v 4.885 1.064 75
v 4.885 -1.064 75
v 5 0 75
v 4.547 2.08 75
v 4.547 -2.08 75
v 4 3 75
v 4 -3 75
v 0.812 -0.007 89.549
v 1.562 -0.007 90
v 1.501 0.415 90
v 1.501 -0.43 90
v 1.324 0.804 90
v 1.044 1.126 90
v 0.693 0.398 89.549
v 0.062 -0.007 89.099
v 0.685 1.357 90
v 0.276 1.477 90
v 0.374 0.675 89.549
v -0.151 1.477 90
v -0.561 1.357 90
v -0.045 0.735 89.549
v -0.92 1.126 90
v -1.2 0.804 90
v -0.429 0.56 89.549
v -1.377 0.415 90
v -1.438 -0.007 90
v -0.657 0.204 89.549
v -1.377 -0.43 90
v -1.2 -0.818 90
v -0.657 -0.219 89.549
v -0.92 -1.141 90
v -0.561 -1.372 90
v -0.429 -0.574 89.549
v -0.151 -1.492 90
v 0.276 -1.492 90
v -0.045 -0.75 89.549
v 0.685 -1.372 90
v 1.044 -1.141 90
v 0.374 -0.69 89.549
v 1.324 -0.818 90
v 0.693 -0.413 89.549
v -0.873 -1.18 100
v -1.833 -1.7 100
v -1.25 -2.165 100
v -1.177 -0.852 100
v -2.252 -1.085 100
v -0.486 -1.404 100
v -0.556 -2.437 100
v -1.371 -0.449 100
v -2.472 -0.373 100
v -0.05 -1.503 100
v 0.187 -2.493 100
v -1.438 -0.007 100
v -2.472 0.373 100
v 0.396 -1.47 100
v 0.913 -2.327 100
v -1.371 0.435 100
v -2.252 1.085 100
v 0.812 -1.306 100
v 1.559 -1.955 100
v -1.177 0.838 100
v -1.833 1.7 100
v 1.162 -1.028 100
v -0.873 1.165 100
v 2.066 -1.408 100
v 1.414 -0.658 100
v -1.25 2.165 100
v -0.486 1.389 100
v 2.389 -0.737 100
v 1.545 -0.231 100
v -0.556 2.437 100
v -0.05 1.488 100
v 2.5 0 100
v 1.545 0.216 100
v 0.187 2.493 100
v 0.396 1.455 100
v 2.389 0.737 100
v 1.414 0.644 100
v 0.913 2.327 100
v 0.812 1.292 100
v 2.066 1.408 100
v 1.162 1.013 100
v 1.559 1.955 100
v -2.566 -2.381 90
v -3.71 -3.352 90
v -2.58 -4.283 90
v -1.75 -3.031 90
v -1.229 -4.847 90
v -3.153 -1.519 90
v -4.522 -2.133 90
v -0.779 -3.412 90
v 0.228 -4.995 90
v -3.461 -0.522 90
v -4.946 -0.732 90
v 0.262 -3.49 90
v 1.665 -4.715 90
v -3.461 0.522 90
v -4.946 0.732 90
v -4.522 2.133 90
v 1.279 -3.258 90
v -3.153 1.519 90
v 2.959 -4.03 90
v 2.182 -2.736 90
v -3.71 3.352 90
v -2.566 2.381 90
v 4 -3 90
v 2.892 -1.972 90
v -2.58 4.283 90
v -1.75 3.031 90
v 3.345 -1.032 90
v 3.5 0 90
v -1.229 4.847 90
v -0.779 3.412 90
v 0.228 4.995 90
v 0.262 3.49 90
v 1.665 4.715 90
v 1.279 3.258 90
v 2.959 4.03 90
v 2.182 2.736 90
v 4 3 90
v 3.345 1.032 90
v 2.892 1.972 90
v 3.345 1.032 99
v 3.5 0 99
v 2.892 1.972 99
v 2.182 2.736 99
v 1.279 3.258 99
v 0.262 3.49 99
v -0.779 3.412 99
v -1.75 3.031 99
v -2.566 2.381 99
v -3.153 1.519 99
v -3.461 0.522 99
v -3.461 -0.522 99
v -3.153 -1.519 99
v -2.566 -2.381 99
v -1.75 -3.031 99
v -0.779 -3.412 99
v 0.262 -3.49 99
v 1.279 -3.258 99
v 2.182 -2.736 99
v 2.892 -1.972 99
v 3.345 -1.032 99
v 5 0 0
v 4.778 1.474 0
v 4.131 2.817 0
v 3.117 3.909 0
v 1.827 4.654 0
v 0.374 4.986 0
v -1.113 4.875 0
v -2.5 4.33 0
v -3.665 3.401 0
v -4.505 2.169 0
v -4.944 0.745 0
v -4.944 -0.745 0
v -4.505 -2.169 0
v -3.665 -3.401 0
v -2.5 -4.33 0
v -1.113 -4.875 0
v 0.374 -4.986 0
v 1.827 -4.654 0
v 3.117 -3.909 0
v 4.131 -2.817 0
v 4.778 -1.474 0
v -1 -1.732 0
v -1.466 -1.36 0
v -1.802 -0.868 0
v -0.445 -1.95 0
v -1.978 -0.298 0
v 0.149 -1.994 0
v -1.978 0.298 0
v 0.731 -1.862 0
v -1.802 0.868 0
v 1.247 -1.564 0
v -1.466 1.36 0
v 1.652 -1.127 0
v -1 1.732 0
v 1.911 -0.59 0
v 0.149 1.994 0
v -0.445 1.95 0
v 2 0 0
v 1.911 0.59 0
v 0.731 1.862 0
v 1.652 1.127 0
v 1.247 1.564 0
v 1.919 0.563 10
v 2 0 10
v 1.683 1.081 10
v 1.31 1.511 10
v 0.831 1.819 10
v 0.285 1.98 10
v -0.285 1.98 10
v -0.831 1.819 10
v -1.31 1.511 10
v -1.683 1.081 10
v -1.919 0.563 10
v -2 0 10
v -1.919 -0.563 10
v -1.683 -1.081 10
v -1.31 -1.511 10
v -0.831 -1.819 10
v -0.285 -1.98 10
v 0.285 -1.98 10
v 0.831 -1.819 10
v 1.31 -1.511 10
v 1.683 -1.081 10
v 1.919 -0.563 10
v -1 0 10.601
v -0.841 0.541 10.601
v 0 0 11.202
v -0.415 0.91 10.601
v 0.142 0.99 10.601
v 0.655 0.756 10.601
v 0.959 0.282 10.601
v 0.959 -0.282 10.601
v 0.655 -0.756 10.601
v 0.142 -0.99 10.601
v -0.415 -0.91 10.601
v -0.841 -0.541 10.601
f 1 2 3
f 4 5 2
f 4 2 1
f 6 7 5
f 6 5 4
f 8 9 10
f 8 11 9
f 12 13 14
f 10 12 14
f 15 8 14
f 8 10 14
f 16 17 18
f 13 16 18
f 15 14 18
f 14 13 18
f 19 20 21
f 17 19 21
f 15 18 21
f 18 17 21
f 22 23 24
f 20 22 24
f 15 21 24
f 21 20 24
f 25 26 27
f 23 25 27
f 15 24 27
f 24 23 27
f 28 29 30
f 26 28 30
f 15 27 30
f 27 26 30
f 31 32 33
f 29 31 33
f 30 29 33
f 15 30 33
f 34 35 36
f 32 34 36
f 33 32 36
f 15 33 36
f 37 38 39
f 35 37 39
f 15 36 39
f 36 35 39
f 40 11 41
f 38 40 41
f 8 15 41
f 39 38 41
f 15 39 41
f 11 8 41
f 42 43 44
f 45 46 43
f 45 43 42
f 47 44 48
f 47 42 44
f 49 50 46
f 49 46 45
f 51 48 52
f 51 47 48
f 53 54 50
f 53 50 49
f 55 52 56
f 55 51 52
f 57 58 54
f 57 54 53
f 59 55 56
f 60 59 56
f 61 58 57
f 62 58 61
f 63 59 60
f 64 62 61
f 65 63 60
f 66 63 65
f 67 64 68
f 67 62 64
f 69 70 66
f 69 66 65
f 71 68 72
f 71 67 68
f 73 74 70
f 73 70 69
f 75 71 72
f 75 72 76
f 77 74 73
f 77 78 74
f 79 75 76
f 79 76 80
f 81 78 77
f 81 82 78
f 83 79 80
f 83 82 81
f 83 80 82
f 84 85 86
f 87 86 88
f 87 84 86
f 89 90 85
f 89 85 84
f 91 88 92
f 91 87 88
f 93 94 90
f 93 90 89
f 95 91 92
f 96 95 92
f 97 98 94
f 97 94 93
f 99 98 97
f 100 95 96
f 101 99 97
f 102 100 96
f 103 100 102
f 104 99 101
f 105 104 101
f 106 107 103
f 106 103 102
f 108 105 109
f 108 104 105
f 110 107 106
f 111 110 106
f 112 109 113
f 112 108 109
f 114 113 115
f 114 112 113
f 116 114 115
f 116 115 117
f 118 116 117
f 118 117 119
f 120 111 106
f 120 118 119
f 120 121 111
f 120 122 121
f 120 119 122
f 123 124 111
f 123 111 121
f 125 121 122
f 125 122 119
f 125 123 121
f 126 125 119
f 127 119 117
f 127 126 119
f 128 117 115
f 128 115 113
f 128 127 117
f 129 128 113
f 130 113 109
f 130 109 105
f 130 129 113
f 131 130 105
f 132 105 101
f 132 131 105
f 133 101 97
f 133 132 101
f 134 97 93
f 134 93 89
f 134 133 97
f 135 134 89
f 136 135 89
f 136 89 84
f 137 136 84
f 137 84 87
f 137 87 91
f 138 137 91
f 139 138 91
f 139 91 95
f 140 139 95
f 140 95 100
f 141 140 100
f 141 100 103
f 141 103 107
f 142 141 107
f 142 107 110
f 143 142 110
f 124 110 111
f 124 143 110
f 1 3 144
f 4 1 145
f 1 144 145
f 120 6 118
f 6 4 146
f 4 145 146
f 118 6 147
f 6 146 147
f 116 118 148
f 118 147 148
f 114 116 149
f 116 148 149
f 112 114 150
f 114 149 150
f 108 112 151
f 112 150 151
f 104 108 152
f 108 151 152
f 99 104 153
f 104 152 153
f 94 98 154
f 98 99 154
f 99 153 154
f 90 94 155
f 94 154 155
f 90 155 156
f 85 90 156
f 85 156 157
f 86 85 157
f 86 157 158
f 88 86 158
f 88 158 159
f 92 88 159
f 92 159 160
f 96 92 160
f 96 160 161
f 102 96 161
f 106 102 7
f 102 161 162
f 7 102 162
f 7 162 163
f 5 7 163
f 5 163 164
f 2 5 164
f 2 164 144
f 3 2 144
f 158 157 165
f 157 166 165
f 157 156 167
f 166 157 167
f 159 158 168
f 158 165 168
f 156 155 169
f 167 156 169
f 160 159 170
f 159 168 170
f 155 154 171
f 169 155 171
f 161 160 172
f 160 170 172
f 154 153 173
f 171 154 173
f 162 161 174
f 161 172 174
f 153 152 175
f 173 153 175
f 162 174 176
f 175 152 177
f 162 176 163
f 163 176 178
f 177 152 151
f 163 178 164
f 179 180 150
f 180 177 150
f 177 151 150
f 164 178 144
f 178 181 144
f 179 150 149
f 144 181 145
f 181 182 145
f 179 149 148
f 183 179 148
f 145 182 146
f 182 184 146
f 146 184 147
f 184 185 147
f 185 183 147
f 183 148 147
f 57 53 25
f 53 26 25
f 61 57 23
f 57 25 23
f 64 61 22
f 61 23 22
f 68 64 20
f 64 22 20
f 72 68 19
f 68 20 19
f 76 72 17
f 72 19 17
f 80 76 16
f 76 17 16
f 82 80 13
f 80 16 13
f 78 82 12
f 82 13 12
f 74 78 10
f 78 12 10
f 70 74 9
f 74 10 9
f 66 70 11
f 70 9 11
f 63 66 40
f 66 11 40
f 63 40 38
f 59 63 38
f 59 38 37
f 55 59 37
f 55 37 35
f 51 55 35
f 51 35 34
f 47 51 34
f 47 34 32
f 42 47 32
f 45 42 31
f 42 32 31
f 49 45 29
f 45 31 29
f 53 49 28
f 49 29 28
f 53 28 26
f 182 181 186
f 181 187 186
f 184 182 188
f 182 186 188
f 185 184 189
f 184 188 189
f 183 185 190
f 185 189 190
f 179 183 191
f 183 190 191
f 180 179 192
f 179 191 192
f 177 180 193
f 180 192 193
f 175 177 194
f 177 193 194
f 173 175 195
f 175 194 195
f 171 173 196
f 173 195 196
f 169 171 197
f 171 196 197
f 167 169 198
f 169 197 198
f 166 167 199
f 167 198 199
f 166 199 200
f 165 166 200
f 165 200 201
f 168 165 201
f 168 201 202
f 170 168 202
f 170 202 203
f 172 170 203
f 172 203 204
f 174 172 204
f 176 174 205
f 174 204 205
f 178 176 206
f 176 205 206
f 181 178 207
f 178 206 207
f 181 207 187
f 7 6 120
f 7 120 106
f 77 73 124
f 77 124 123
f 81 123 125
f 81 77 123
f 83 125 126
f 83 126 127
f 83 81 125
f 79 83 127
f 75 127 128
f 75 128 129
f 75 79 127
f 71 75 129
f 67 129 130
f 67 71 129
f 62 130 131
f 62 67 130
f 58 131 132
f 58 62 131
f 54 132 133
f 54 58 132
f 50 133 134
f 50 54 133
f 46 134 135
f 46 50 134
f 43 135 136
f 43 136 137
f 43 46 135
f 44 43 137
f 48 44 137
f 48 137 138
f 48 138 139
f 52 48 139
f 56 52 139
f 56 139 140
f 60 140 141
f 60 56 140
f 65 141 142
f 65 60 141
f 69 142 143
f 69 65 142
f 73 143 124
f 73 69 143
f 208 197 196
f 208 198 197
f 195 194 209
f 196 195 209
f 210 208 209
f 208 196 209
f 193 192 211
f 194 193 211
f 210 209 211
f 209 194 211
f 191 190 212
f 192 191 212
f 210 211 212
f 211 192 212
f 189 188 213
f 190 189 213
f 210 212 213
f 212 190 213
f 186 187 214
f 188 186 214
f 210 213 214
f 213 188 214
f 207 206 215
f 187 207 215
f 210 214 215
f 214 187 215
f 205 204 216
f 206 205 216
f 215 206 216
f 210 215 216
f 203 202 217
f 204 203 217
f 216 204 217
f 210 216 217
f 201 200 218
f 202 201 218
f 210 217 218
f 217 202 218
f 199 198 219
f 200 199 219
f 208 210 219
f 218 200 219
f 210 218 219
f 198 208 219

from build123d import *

# Parameters (mm, degrees)
SKETCH15_R         = 5
BASE_EXTRUDE_DEPTH = 100
SKETCH24_OUTSIDE_W = 32.2
SKETCH24_OUTSIDE_H = 32.2
SKETCH24_OUTSIDE_R = 3.5
FRONT_CUT_DEPTH    = 10
FRONT_HOLE_D       = 3
FRONT_HOLE_DEPTH   = 10
FRONT_HOLE_TIP     = 0.901290929
CHAMFER1_SIZE      = 1
KEYWAY_CUT_START   = -25
KEYWAY_CUT_DEPTH   = 25
BACK_HOLE_D        = 4
BACK_HOLE_DEPTH    = 10
BACK_HOLE_TIP      = 1.201721238


with BuildPart() as part:
    # Sketch15 → Base Extrude (new body)
    with BuildSketch(Plane.XY):
        Circle(SKETCH15_R)
    extrude(amount=BASE_EXTRUDE_DEPTH)

    # Sketch24 outside → Front Cut (cut)
    with BuildSketch(Plane.XY.offset(100)):
        Rectangle(SKETCH24_OUTSIDE_W, SKETCH24_OUTSIDE_H)
        Circle(SKETCH24_OUTSIDE_R, mode=Mode.SUBTRACT)
    extrude(amount=-FRONT_CUT_DEPTH, mode=Mode.SUBTRACT)

    # Front Hole
    with Locations(Plane(origin=(0.062150556, -0.00731183, 100), x_dir=(1, 0, 0), z_dir=(0, 0, 1))):
        with Locations((0, 0)):
            Hole(FRONT_HOLE_D / 2, depth=FRONT_HOLE_DEPTH)
            with Locations((0, 0, -(FRONT_HOLE_DEPTH + FRONT_HOLE_TIP / 2))):  # 118° drill point
                Cone(0, FRONT_HOLE_D / 2, FRONT_HOLE_TIP, mode=Mode.SUBTRACT)

    # Chamfer1
    chamfer1_edges = [part.edges().sort_by_distance(p)[0] for p in [
        (-3.5, 0, 100),
    ]]
    chamfer(chamfer1_edges, length=CHAMFER1_SIZE)

    # Keyway → Keyway-Cut (cut)
    with BuildSketch(Plane.XY.offset(100).offset(KEYWAY_CUT_START)):
        with BuildLine():
            ThreePointArc((5, 0), (4.74341649, 1.58113883), (4, 3))
            Line((4, 3), (4, -3))
            ThreePointArc((4, -3), (4.74341649, -1.58113883), (5, 0))
        make_face()
    extrude(amount=KEYWAY_CUT_DEPTH, mode=Mode.SUBTRACT)

    # Back Hole
    with Locations(Plane(origin=(0, 0, 0), x_dir=(-1, 0, 0), z_dir=(0, 0, -1))):
        with Locations((0, 0)):
            Hole(BACK_HOLE_D / 2, depth=BACK_HOLE_DEPTH)
            with Locations((0, 0, -(BACK_HOLE_DEPTH + BACK_HOLE_TIP / 2))):  # 118° drill point
                Cone(0, BACK_HOLE_D / 2, BACK_HOLE_TIP, mode=Mode.SUBTRACT)


solid = part.part
